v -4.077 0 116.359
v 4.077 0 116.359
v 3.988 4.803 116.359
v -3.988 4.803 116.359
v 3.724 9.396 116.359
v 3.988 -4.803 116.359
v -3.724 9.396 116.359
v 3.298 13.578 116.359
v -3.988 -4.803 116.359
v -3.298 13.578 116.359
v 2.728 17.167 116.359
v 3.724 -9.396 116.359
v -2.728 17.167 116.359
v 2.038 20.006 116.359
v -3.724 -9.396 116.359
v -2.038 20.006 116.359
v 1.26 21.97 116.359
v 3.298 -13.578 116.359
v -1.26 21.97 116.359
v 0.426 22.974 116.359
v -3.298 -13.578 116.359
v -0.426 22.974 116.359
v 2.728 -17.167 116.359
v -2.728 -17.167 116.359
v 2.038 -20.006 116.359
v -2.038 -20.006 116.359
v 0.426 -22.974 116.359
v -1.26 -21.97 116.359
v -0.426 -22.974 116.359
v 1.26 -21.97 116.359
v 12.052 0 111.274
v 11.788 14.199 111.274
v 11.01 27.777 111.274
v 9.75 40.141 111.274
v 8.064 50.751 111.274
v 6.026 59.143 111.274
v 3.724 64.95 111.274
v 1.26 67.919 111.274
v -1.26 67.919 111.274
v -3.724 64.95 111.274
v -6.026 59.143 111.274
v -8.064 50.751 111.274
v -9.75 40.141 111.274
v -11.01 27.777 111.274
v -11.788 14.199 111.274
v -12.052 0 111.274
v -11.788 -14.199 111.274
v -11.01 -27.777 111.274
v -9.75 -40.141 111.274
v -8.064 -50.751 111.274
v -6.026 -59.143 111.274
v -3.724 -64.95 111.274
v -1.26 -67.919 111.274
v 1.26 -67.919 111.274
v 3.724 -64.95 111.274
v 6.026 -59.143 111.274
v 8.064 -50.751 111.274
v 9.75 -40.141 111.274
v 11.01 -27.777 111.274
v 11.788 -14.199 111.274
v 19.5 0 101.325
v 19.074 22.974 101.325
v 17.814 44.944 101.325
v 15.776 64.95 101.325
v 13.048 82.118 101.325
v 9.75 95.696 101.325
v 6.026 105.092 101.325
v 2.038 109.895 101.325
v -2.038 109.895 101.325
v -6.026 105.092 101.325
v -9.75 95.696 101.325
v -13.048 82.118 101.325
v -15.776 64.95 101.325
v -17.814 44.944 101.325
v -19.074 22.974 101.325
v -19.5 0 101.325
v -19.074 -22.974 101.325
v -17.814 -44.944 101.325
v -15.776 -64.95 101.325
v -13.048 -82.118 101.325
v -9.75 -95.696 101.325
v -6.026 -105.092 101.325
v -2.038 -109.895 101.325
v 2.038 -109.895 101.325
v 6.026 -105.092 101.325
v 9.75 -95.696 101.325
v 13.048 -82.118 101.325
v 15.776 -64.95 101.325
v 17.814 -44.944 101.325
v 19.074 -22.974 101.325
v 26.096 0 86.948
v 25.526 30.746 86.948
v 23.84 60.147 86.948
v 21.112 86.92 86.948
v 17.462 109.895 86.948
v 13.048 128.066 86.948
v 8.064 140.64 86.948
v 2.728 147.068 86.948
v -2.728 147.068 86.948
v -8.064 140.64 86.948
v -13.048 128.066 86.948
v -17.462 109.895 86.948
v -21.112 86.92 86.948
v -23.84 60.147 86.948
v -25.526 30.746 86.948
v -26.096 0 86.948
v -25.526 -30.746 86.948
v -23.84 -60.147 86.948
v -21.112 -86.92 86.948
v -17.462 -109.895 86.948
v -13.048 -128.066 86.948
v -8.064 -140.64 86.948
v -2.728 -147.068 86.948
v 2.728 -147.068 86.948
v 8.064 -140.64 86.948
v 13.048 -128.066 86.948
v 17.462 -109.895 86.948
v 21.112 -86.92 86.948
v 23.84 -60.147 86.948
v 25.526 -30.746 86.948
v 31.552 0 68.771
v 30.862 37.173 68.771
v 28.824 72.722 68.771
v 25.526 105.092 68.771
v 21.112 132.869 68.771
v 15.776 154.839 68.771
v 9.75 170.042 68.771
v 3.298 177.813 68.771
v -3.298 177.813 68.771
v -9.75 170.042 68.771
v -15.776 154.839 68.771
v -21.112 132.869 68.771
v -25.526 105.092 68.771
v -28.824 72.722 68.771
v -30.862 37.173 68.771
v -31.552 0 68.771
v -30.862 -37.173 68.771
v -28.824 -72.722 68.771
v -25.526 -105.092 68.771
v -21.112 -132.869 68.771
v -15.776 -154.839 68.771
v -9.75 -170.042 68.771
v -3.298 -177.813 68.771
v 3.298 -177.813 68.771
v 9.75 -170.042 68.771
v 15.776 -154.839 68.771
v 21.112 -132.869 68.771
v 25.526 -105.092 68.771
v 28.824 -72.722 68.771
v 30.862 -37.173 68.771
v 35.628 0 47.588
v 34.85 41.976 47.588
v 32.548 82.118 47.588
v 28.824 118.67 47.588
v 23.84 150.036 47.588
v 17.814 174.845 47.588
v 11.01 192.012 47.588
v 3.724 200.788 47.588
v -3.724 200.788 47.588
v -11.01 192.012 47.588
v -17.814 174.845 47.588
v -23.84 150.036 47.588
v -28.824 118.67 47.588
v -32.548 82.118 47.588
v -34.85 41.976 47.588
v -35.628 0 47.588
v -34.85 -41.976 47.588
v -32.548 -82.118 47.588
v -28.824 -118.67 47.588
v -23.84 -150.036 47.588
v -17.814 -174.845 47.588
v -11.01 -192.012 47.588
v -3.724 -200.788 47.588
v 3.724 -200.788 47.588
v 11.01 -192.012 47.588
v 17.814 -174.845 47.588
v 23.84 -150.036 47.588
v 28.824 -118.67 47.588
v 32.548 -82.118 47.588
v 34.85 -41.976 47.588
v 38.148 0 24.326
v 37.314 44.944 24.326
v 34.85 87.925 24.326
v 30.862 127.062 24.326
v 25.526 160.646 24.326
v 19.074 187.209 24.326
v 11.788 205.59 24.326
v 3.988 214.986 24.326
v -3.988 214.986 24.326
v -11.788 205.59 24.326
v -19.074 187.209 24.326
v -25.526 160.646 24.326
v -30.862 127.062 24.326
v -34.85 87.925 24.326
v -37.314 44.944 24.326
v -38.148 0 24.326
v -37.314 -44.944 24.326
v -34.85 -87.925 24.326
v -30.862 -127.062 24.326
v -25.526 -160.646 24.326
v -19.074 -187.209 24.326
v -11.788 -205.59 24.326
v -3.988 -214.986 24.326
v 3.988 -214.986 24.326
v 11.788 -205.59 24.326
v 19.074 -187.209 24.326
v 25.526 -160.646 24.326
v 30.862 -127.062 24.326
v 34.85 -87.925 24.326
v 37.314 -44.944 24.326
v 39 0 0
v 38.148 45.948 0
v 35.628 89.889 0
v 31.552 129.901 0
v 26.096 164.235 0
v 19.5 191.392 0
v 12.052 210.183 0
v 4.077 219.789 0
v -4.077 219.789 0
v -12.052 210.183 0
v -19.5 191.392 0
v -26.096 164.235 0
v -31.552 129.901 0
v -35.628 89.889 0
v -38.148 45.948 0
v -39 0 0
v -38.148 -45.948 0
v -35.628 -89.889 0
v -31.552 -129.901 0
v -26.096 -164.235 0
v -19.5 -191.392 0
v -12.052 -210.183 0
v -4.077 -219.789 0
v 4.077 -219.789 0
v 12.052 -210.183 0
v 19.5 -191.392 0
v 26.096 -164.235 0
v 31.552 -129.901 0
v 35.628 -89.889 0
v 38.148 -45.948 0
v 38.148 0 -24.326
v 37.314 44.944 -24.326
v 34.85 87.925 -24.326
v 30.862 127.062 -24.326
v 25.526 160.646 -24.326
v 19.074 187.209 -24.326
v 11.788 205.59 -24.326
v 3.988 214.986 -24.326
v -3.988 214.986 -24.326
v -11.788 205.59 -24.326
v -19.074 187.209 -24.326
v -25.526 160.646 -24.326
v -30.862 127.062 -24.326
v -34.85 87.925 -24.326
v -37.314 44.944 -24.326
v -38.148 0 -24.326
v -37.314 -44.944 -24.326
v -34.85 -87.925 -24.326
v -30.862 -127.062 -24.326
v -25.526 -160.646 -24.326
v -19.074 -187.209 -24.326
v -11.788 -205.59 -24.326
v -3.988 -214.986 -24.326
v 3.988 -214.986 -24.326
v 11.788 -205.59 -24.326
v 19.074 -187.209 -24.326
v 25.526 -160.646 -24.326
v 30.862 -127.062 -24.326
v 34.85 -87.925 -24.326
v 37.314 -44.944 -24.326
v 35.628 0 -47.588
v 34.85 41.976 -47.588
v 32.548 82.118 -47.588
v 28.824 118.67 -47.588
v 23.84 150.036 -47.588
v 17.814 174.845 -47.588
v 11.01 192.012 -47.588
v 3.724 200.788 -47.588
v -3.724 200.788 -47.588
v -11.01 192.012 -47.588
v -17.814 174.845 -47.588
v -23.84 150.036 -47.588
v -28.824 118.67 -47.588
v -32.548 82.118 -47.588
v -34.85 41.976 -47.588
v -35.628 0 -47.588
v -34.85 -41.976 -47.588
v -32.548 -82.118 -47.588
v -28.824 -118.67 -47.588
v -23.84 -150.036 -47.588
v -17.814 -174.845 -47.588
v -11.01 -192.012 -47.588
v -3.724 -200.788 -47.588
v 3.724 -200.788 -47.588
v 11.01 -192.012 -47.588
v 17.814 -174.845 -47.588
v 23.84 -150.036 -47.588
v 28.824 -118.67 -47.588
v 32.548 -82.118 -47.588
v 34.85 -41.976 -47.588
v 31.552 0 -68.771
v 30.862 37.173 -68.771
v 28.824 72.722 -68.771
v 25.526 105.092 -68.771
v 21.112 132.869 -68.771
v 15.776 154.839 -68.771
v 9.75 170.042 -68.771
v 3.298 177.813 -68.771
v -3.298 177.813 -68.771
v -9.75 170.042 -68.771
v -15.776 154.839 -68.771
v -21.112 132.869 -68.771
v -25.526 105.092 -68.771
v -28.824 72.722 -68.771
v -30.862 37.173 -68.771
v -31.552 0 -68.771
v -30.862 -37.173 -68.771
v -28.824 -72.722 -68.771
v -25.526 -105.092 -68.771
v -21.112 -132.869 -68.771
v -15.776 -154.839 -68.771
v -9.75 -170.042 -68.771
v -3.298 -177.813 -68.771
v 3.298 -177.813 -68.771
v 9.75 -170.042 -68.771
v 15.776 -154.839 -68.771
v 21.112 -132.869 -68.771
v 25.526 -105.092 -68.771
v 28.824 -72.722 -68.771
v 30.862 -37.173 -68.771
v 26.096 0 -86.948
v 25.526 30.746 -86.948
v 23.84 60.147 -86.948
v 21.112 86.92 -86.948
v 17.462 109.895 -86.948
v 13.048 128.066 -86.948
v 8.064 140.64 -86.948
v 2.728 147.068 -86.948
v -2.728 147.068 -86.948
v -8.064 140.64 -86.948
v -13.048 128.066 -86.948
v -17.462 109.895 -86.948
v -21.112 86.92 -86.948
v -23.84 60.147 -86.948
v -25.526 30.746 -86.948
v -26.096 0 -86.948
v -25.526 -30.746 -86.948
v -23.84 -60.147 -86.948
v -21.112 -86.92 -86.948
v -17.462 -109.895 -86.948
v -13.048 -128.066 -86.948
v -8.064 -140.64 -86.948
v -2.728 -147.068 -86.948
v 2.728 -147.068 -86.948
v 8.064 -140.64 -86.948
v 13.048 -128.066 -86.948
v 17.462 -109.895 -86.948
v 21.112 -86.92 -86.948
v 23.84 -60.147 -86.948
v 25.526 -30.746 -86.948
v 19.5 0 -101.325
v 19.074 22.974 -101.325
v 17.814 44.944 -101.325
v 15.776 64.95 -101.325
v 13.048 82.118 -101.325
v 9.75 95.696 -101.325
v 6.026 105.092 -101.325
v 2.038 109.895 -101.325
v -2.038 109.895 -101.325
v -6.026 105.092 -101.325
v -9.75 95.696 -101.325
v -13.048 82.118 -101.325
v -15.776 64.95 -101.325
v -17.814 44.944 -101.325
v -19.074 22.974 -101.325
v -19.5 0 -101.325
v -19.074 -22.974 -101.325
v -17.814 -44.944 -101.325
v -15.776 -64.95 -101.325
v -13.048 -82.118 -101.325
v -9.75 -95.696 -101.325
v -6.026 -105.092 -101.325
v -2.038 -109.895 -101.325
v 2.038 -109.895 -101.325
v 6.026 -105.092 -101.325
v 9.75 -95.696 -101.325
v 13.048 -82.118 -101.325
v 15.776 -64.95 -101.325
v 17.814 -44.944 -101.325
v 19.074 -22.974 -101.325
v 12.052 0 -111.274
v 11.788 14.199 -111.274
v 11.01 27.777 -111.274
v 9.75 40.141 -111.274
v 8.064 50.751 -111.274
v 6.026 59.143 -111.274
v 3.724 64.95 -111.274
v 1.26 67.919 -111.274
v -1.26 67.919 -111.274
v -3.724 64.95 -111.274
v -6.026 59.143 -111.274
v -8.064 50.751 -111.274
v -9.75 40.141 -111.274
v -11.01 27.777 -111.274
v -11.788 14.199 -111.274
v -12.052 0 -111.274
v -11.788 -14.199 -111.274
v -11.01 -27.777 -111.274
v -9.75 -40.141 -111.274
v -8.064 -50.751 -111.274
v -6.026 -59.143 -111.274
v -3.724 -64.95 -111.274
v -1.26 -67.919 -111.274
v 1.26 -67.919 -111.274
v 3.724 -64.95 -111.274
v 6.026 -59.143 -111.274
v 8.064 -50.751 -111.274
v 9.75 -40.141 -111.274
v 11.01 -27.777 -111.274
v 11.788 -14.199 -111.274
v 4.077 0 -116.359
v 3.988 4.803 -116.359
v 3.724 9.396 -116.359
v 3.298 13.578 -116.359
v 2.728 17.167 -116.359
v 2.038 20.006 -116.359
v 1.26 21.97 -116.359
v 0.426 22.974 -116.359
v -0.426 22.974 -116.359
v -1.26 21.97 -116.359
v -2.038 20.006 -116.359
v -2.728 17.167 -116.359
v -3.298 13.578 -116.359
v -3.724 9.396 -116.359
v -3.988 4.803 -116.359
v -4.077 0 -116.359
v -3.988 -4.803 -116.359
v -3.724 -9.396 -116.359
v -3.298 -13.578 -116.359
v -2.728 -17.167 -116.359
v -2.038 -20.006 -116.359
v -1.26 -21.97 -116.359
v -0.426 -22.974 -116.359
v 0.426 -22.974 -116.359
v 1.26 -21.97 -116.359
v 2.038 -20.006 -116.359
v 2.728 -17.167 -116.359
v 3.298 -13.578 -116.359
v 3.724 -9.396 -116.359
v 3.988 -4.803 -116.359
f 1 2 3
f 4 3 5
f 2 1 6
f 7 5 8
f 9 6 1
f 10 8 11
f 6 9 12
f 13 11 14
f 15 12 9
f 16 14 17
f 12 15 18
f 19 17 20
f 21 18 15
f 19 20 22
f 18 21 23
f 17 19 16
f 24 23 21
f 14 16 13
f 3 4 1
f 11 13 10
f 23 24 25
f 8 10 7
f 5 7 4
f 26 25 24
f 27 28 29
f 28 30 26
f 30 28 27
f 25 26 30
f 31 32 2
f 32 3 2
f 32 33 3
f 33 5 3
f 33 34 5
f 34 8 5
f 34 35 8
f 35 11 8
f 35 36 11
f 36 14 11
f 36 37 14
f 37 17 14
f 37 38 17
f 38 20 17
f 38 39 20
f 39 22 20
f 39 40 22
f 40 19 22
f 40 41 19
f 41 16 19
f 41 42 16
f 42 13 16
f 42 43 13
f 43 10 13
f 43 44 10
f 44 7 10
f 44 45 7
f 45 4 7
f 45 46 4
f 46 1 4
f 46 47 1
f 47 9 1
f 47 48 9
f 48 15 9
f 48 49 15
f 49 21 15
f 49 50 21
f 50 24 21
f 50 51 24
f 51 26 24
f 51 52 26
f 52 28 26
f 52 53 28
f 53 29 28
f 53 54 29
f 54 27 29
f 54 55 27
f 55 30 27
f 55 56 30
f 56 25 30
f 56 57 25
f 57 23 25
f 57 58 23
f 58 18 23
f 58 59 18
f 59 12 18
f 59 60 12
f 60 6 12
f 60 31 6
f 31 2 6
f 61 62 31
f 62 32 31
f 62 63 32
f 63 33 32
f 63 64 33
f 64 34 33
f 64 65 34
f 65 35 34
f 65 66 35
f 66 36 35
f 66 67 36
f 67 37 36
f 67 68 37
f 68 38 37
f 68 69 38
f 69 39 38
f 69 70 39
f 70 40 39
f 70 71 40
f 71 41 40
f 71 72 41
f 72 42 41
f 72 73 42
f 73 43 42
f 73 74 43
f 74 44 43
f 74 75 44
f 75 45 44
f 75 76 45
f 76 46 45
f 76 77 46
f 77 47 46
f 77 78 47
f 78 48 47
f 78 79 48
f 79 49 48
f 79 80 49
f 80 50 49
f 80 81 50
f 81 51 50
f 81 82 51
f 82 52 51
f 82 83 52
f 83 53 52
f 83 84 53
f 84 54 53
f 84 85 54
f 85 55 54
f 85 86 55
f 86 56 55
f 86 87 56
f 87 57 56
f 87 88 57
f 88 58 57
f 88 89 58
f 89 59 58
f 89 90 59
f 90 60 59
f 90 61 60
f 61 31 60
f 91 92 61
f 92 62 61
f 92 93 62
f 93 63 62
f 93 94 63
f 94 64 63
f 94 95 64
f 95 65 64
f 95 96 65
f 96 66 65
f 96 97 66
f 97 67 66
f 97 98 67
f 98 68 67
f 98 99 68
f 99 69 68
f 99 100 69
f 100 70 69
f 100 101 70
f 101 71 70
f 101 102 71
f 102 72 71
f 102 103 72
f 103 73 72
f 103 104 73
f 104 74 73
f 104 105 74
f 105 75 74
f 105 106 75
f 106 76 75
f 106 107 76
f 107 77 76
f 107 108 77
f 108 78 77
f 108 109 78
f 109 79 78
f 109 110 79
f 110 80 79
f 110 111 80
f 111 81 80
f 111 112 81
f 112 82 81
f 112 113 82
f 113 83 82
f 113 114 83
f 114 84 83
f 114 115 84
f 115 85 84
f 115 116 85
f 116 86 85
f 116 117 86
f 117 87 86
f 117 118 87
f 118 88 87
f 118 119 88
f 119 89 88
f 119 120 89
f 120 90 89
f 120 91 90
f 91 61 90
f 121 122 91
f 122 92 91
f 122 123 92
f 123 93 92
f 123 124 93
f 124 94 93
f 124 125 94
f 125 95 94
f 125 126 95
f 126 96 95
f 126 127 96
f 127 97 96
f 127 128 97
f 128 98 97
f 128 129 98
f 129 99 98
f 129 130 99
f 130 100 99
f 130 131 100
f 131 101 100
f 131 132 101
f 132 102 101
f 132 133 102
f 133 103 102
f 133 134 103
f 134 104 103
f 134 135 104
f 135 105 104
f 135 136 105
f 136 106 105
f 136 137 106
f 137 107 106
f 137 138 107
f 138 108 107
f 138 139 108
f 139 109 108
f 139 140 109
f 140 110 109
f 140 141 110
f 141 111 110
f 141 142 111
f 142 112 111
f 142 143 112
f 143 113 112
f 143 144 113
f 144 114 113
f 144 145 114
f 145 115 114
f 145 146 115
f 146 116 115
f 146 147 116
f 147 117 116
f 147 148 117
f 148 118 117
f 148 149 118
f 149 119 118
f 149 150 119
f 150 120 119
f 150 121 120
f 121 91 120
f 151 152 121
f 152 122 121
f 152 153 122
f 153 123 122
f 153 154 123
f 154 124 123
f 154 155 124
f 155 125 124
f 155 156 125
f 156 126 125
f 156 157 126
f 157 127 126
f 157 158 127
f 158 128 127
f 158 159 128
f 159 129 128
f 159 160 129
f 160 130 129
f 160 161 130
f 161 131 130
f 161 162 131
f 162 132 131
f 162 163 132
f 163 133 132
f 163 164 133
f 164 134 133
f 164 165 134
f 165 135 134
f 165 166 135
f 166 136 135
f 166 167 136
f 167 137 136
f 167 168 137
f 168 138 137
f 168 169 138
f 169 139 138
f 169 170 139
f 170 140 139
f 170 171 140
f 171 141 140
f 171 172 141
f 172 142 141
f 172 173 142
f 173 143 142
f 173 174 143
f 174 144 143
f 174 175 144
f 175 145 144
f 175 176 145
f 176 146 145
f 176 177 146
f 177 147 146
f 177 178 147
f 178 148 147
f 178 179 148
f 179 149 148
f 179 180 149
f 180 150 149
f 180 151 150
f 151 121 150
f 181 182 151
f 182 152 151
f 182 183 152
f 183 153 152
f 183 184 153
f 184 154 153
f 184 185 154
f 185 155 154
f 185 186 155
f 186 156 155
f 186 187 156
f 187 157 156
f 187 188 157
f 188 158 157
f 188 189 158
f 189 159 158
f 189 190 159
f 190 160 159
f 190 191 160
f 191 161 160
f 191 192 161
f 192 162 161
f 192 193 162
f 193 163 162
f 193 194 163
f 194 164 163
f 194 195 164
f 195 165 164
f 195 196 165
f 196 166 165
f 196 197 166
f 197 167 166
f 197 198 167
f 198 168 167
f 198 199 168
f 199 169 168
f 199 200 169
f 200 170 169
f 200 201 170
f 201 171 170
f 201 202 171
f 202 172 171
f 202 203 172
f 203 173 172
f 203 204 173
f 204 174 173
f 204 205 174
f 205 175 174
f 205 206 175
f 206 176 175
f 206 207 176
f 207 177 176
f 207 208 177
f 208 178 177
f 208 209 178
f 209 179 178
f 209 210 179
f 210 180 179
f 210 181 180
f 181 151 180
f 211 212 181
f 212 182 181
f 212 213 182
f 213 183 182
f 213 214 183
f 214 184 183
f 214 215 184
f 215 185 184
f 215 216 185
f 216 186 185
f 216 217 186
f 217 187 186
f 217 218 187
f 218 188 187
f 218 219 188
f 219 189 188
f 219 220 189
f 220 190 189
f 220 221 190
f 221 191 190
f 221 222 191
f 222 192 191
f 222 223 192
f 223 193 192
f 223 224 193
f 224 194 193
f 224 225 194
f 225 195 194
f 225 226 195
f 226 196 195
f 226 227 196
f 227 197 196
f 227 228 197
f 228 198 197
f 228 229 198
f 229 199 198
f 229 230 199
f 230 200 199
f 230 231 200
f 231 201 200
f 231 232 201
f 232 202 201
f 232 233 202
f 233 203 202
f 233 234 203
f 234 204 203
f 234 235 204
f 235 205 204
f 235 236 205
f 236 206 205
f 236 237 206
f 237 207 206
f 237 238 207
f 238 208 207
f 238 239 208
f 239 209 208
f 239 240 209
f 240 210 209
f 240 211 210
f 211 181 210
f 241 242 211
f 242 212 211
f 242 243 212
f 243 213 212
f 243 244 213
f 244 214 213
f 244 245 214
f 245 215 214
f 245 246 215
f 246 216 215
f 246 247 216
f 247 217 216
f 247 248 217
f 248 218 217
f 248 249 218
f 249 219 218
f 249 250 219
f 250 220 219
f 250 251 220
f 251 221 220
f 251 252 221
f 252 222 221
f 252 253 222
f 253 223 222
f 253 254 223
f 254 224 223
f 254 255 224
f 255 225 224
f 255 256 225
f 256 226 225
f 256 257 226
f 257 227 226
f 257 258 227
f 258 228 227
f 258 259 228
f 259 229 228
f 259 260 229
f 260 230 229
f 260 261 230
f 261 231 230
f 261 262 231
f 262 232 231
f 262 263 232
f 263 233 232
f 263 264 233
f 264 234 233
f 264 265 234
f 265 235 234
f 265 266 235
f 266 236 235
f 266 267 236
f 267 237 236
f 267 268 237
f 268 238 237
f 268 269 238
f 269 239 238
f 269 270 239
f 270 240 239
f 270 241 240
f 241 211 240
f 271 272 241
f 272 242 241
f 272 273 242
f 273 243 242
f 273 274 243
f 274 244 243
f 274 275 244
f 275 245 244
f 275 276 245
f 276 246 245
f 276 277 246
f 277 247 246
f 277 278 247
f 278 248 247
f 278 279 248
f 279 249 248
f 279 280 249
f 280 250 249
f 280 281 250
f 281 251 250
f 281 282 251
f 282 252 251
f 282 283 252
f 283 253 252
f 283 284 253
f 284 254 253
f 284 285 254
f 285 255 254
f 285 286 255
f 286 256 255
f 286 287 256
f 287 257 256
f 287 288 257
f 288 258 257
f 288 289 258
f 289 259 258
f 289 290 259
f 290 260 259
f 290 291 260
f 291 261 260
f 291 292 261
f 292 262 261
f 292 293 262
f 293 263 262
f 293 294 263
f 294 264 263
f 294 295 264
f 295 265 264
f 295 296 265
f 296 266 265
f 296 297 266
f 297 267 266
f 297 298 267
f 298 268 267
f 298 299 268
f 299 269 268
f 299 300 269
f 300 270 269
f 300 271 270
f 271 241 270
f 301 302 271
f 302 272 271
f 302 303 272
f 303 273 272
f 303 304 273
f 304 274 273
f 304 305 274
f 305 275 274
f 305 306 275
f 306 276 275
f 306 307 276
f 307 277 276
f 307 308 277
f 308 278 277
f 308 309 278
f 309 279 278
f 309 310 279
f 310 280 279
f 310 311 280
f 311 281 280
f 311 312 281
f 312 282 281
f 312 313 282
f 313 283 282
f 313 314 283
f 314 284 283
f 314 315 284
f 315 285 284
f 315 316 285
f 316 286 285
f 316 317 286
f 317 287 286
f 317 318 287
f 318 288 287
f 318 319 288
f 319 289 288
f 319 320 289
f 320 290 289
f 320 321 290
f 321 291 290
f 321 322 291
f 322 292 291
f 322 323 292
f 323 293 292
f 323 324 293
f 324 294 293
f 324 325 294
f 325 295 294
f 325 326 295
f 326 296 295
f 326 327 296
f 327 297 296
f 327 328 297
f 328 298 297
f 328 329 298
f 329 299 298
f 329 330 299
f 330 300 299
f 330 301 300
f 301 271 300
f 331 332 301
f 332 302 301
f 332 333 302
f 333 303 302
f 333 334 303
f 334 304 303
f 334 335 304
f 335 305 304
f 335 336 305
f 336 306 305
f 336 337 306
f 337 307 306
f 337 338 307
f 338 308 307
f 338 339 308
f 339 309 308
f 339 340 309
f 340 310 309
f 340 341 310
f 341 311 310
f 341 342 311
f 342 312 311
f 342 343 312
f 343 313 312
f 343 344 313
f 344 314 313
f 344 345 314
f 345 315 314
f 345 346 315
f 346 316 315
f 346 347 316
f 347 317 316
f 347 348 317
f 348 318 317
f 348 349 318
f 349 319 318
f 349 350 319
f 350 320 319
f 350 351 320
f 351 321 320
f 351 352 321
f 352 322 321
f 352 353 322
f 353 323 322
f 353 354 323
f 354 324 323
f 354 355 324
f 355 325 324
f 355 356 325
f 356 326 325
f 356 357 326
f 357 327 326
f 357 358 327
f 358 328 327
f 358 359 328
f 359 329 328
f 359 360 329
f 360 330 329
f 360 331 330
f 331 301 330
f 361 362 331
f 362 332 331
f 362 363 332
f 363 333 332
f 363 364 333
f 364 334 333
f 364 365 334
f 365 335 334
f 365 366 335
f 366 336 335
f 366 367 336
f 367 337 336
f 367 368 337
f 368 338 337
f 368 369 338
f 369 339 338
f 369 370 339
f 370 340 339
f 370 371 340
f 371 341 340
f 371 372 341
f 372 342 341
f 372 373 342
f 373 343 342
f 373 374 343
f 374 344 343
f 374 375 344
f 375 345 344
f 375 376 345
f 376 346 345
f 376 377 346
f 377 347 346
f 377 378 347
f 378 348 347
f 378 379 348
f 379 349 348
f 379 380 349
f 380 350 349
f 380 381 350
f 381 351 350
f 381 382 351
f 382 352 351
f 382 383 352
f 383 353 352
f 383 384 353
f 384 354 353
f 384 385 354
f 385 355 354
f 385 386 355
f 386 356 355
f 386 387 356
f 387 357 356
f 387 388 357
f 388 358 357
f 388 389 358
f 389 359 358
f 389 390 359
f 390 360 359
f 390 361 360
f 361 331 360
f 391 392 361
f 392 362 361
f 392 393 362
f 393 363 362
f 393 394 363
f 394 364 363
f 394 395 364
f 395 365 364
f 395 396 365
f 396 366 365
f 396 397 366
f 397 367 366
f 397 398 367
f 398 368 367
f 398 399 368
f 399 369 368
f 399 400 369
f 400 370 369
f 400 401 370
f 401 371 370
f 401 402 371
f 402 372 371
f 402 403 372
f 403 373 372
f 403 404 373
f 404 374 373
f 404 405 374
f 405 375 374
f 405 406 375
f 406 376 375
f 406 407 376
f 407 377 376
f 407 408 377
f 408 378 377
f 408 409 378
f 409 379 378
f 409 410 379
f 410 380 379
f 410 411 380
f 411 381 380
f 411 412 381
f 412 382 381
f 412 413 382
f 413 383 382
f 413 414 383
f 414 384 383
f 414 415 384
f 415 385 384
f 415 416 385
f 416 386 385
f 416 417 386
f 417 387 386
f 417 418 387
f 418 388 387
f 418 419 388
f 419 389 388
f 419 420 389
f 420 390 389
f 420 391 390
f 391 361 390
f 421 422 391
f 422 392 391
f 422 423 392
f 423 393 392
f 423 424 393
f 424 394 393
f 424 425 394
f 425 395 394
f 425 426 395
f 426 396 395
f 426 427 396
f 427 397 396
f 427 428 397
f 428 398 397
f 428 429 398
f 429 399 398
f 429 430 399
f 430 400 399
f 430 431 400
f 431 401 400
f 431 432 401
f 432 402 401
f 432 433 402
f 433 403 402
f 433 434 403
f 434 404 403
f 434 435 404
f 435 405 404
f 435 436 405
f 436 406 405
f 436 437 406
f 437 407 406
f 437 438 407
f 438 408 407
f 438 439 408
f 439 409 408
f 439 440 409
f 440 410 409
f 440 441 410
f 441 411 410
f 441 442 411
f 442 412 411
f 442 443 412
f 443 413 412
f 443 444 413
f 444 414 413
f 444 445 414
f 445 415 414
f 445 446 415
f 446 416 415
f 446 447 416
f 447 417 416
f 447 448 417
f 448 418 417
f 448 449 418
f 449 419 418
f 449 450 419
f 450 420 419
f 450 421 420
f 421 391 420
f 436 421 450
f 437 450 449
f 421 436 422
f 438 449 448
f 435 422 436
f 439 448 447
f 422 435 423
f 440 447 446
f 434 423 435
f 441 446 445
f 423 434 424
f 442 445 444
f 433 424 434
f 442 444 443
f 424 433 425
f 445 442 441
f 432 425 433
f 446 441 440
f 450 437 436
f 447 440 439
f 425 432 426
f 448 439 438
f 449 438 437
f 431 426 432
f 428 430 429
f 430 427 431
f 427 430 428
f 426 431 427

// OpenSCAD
// Generated by SolidPython 1.0.1 on 2020-07-29 00:46:46


scale(v = [3, 17, 9]) {
	sphere(r = 13);
}
/***********************************************
*********      SolidPython code:      **********
************************************************
 
# import packages: SolidPython
from solid import *
from solid.utils import *
from itertools import chain, combinations, permutations


class Resize:

    def __init__(self, scad_file):
        self.scad_file = scad_file
        #self.scad_file = import_scad(scad_file)
        # cone/cylinder param:
        self.r1 = 0
        self.r2 = 0
        self.h = 0
        # rectangular prism param:
        self.w = 0
        self.l = 0
        # ellipse param:
        self.r = 0

    # import OpenScad code (file name corresponds to shape)


    # classify shape + parameters
    def assign(self, param1, param2, param3):
        if self.scad_file == 'cone.scad':
            self.r1 = param1
            self.r2 = param2
            self.h = param3
        elif self.scad_file == 'cylinder.scad':
            self.r1 = param1
            self.r2 = param2
            self.h = param3
        elif self.scad_file == 'rectangularPrism.scad':
            self.h = param1
            self.l = param2
            self.w = param3
        else:
            self.r = param1
            self.h = param2

    # resize parameters
    def iterate(self):
        x = range(3, 20, 2)
        i = 1
        if self.scad_file == 'cone.scad':
            tempList = list(permutations(x, 2))
            for temp in tempList:
                param1 = temp[0]
                param2 = temp[1]
                filepath = 'produced_scad_files/' + 'cone' + str(param1) + '_' + str(param2) + '_' + '.scad'
                scad_render_to_file(cylinder(h=param1, r1=param2, r2=0), filepath)

        elif self.scad_file == 'cylinder.scad':
            tempList = list(permutations(x, 3))
            for temp in tempList:
                param1 = temp[0]
                param2 = temp[1]
                filepath = 'produced_scad_files/' + 'cylinder' + str(param1) + '_' + str(param2) + '_' + '.scad'
                scad_render_to_file(cylinder(h=param1, r1=param2, r2=param2), filepath)

        elif self.scad_file == 'rectangularPrism.scad':
            tempList = list(permutations(x, 3))
            for temp in tempList:
                param1 = temp[0]
                param2 = temp[1]
                param3 = temp[2]
                filepath = 'produced_scad_files/' + 'rectangularPrism' + str(param1) + '_' + str(param2) + '_' + str(
                    param3) + '.scad'
                scad_render_to_file(cube(size=(param1, param2, param3)), filepath)

        elif self.scad_file == 'ellipse.scad':
            tempList = list(permutations(x, 4))
            for temp in tempList:
                param1 = temp[0]
                param2 = temp[1]
                param3 = temp[2]
                param4 = temp[3]
                filepath = 'produced_scad_files/' + 'ellipse' + str(param1) + '_' + str(param2) + '_' + str(param3) + '_' + str(param4) + '.scad'
                scad_render_to_file(scale([param1, param2, param3])(sphere(r=param4)), filepath)

    def render_to_scadfile(self):
        scad_render_to_file(scad, 'example.scad') 
 
************************************************/
